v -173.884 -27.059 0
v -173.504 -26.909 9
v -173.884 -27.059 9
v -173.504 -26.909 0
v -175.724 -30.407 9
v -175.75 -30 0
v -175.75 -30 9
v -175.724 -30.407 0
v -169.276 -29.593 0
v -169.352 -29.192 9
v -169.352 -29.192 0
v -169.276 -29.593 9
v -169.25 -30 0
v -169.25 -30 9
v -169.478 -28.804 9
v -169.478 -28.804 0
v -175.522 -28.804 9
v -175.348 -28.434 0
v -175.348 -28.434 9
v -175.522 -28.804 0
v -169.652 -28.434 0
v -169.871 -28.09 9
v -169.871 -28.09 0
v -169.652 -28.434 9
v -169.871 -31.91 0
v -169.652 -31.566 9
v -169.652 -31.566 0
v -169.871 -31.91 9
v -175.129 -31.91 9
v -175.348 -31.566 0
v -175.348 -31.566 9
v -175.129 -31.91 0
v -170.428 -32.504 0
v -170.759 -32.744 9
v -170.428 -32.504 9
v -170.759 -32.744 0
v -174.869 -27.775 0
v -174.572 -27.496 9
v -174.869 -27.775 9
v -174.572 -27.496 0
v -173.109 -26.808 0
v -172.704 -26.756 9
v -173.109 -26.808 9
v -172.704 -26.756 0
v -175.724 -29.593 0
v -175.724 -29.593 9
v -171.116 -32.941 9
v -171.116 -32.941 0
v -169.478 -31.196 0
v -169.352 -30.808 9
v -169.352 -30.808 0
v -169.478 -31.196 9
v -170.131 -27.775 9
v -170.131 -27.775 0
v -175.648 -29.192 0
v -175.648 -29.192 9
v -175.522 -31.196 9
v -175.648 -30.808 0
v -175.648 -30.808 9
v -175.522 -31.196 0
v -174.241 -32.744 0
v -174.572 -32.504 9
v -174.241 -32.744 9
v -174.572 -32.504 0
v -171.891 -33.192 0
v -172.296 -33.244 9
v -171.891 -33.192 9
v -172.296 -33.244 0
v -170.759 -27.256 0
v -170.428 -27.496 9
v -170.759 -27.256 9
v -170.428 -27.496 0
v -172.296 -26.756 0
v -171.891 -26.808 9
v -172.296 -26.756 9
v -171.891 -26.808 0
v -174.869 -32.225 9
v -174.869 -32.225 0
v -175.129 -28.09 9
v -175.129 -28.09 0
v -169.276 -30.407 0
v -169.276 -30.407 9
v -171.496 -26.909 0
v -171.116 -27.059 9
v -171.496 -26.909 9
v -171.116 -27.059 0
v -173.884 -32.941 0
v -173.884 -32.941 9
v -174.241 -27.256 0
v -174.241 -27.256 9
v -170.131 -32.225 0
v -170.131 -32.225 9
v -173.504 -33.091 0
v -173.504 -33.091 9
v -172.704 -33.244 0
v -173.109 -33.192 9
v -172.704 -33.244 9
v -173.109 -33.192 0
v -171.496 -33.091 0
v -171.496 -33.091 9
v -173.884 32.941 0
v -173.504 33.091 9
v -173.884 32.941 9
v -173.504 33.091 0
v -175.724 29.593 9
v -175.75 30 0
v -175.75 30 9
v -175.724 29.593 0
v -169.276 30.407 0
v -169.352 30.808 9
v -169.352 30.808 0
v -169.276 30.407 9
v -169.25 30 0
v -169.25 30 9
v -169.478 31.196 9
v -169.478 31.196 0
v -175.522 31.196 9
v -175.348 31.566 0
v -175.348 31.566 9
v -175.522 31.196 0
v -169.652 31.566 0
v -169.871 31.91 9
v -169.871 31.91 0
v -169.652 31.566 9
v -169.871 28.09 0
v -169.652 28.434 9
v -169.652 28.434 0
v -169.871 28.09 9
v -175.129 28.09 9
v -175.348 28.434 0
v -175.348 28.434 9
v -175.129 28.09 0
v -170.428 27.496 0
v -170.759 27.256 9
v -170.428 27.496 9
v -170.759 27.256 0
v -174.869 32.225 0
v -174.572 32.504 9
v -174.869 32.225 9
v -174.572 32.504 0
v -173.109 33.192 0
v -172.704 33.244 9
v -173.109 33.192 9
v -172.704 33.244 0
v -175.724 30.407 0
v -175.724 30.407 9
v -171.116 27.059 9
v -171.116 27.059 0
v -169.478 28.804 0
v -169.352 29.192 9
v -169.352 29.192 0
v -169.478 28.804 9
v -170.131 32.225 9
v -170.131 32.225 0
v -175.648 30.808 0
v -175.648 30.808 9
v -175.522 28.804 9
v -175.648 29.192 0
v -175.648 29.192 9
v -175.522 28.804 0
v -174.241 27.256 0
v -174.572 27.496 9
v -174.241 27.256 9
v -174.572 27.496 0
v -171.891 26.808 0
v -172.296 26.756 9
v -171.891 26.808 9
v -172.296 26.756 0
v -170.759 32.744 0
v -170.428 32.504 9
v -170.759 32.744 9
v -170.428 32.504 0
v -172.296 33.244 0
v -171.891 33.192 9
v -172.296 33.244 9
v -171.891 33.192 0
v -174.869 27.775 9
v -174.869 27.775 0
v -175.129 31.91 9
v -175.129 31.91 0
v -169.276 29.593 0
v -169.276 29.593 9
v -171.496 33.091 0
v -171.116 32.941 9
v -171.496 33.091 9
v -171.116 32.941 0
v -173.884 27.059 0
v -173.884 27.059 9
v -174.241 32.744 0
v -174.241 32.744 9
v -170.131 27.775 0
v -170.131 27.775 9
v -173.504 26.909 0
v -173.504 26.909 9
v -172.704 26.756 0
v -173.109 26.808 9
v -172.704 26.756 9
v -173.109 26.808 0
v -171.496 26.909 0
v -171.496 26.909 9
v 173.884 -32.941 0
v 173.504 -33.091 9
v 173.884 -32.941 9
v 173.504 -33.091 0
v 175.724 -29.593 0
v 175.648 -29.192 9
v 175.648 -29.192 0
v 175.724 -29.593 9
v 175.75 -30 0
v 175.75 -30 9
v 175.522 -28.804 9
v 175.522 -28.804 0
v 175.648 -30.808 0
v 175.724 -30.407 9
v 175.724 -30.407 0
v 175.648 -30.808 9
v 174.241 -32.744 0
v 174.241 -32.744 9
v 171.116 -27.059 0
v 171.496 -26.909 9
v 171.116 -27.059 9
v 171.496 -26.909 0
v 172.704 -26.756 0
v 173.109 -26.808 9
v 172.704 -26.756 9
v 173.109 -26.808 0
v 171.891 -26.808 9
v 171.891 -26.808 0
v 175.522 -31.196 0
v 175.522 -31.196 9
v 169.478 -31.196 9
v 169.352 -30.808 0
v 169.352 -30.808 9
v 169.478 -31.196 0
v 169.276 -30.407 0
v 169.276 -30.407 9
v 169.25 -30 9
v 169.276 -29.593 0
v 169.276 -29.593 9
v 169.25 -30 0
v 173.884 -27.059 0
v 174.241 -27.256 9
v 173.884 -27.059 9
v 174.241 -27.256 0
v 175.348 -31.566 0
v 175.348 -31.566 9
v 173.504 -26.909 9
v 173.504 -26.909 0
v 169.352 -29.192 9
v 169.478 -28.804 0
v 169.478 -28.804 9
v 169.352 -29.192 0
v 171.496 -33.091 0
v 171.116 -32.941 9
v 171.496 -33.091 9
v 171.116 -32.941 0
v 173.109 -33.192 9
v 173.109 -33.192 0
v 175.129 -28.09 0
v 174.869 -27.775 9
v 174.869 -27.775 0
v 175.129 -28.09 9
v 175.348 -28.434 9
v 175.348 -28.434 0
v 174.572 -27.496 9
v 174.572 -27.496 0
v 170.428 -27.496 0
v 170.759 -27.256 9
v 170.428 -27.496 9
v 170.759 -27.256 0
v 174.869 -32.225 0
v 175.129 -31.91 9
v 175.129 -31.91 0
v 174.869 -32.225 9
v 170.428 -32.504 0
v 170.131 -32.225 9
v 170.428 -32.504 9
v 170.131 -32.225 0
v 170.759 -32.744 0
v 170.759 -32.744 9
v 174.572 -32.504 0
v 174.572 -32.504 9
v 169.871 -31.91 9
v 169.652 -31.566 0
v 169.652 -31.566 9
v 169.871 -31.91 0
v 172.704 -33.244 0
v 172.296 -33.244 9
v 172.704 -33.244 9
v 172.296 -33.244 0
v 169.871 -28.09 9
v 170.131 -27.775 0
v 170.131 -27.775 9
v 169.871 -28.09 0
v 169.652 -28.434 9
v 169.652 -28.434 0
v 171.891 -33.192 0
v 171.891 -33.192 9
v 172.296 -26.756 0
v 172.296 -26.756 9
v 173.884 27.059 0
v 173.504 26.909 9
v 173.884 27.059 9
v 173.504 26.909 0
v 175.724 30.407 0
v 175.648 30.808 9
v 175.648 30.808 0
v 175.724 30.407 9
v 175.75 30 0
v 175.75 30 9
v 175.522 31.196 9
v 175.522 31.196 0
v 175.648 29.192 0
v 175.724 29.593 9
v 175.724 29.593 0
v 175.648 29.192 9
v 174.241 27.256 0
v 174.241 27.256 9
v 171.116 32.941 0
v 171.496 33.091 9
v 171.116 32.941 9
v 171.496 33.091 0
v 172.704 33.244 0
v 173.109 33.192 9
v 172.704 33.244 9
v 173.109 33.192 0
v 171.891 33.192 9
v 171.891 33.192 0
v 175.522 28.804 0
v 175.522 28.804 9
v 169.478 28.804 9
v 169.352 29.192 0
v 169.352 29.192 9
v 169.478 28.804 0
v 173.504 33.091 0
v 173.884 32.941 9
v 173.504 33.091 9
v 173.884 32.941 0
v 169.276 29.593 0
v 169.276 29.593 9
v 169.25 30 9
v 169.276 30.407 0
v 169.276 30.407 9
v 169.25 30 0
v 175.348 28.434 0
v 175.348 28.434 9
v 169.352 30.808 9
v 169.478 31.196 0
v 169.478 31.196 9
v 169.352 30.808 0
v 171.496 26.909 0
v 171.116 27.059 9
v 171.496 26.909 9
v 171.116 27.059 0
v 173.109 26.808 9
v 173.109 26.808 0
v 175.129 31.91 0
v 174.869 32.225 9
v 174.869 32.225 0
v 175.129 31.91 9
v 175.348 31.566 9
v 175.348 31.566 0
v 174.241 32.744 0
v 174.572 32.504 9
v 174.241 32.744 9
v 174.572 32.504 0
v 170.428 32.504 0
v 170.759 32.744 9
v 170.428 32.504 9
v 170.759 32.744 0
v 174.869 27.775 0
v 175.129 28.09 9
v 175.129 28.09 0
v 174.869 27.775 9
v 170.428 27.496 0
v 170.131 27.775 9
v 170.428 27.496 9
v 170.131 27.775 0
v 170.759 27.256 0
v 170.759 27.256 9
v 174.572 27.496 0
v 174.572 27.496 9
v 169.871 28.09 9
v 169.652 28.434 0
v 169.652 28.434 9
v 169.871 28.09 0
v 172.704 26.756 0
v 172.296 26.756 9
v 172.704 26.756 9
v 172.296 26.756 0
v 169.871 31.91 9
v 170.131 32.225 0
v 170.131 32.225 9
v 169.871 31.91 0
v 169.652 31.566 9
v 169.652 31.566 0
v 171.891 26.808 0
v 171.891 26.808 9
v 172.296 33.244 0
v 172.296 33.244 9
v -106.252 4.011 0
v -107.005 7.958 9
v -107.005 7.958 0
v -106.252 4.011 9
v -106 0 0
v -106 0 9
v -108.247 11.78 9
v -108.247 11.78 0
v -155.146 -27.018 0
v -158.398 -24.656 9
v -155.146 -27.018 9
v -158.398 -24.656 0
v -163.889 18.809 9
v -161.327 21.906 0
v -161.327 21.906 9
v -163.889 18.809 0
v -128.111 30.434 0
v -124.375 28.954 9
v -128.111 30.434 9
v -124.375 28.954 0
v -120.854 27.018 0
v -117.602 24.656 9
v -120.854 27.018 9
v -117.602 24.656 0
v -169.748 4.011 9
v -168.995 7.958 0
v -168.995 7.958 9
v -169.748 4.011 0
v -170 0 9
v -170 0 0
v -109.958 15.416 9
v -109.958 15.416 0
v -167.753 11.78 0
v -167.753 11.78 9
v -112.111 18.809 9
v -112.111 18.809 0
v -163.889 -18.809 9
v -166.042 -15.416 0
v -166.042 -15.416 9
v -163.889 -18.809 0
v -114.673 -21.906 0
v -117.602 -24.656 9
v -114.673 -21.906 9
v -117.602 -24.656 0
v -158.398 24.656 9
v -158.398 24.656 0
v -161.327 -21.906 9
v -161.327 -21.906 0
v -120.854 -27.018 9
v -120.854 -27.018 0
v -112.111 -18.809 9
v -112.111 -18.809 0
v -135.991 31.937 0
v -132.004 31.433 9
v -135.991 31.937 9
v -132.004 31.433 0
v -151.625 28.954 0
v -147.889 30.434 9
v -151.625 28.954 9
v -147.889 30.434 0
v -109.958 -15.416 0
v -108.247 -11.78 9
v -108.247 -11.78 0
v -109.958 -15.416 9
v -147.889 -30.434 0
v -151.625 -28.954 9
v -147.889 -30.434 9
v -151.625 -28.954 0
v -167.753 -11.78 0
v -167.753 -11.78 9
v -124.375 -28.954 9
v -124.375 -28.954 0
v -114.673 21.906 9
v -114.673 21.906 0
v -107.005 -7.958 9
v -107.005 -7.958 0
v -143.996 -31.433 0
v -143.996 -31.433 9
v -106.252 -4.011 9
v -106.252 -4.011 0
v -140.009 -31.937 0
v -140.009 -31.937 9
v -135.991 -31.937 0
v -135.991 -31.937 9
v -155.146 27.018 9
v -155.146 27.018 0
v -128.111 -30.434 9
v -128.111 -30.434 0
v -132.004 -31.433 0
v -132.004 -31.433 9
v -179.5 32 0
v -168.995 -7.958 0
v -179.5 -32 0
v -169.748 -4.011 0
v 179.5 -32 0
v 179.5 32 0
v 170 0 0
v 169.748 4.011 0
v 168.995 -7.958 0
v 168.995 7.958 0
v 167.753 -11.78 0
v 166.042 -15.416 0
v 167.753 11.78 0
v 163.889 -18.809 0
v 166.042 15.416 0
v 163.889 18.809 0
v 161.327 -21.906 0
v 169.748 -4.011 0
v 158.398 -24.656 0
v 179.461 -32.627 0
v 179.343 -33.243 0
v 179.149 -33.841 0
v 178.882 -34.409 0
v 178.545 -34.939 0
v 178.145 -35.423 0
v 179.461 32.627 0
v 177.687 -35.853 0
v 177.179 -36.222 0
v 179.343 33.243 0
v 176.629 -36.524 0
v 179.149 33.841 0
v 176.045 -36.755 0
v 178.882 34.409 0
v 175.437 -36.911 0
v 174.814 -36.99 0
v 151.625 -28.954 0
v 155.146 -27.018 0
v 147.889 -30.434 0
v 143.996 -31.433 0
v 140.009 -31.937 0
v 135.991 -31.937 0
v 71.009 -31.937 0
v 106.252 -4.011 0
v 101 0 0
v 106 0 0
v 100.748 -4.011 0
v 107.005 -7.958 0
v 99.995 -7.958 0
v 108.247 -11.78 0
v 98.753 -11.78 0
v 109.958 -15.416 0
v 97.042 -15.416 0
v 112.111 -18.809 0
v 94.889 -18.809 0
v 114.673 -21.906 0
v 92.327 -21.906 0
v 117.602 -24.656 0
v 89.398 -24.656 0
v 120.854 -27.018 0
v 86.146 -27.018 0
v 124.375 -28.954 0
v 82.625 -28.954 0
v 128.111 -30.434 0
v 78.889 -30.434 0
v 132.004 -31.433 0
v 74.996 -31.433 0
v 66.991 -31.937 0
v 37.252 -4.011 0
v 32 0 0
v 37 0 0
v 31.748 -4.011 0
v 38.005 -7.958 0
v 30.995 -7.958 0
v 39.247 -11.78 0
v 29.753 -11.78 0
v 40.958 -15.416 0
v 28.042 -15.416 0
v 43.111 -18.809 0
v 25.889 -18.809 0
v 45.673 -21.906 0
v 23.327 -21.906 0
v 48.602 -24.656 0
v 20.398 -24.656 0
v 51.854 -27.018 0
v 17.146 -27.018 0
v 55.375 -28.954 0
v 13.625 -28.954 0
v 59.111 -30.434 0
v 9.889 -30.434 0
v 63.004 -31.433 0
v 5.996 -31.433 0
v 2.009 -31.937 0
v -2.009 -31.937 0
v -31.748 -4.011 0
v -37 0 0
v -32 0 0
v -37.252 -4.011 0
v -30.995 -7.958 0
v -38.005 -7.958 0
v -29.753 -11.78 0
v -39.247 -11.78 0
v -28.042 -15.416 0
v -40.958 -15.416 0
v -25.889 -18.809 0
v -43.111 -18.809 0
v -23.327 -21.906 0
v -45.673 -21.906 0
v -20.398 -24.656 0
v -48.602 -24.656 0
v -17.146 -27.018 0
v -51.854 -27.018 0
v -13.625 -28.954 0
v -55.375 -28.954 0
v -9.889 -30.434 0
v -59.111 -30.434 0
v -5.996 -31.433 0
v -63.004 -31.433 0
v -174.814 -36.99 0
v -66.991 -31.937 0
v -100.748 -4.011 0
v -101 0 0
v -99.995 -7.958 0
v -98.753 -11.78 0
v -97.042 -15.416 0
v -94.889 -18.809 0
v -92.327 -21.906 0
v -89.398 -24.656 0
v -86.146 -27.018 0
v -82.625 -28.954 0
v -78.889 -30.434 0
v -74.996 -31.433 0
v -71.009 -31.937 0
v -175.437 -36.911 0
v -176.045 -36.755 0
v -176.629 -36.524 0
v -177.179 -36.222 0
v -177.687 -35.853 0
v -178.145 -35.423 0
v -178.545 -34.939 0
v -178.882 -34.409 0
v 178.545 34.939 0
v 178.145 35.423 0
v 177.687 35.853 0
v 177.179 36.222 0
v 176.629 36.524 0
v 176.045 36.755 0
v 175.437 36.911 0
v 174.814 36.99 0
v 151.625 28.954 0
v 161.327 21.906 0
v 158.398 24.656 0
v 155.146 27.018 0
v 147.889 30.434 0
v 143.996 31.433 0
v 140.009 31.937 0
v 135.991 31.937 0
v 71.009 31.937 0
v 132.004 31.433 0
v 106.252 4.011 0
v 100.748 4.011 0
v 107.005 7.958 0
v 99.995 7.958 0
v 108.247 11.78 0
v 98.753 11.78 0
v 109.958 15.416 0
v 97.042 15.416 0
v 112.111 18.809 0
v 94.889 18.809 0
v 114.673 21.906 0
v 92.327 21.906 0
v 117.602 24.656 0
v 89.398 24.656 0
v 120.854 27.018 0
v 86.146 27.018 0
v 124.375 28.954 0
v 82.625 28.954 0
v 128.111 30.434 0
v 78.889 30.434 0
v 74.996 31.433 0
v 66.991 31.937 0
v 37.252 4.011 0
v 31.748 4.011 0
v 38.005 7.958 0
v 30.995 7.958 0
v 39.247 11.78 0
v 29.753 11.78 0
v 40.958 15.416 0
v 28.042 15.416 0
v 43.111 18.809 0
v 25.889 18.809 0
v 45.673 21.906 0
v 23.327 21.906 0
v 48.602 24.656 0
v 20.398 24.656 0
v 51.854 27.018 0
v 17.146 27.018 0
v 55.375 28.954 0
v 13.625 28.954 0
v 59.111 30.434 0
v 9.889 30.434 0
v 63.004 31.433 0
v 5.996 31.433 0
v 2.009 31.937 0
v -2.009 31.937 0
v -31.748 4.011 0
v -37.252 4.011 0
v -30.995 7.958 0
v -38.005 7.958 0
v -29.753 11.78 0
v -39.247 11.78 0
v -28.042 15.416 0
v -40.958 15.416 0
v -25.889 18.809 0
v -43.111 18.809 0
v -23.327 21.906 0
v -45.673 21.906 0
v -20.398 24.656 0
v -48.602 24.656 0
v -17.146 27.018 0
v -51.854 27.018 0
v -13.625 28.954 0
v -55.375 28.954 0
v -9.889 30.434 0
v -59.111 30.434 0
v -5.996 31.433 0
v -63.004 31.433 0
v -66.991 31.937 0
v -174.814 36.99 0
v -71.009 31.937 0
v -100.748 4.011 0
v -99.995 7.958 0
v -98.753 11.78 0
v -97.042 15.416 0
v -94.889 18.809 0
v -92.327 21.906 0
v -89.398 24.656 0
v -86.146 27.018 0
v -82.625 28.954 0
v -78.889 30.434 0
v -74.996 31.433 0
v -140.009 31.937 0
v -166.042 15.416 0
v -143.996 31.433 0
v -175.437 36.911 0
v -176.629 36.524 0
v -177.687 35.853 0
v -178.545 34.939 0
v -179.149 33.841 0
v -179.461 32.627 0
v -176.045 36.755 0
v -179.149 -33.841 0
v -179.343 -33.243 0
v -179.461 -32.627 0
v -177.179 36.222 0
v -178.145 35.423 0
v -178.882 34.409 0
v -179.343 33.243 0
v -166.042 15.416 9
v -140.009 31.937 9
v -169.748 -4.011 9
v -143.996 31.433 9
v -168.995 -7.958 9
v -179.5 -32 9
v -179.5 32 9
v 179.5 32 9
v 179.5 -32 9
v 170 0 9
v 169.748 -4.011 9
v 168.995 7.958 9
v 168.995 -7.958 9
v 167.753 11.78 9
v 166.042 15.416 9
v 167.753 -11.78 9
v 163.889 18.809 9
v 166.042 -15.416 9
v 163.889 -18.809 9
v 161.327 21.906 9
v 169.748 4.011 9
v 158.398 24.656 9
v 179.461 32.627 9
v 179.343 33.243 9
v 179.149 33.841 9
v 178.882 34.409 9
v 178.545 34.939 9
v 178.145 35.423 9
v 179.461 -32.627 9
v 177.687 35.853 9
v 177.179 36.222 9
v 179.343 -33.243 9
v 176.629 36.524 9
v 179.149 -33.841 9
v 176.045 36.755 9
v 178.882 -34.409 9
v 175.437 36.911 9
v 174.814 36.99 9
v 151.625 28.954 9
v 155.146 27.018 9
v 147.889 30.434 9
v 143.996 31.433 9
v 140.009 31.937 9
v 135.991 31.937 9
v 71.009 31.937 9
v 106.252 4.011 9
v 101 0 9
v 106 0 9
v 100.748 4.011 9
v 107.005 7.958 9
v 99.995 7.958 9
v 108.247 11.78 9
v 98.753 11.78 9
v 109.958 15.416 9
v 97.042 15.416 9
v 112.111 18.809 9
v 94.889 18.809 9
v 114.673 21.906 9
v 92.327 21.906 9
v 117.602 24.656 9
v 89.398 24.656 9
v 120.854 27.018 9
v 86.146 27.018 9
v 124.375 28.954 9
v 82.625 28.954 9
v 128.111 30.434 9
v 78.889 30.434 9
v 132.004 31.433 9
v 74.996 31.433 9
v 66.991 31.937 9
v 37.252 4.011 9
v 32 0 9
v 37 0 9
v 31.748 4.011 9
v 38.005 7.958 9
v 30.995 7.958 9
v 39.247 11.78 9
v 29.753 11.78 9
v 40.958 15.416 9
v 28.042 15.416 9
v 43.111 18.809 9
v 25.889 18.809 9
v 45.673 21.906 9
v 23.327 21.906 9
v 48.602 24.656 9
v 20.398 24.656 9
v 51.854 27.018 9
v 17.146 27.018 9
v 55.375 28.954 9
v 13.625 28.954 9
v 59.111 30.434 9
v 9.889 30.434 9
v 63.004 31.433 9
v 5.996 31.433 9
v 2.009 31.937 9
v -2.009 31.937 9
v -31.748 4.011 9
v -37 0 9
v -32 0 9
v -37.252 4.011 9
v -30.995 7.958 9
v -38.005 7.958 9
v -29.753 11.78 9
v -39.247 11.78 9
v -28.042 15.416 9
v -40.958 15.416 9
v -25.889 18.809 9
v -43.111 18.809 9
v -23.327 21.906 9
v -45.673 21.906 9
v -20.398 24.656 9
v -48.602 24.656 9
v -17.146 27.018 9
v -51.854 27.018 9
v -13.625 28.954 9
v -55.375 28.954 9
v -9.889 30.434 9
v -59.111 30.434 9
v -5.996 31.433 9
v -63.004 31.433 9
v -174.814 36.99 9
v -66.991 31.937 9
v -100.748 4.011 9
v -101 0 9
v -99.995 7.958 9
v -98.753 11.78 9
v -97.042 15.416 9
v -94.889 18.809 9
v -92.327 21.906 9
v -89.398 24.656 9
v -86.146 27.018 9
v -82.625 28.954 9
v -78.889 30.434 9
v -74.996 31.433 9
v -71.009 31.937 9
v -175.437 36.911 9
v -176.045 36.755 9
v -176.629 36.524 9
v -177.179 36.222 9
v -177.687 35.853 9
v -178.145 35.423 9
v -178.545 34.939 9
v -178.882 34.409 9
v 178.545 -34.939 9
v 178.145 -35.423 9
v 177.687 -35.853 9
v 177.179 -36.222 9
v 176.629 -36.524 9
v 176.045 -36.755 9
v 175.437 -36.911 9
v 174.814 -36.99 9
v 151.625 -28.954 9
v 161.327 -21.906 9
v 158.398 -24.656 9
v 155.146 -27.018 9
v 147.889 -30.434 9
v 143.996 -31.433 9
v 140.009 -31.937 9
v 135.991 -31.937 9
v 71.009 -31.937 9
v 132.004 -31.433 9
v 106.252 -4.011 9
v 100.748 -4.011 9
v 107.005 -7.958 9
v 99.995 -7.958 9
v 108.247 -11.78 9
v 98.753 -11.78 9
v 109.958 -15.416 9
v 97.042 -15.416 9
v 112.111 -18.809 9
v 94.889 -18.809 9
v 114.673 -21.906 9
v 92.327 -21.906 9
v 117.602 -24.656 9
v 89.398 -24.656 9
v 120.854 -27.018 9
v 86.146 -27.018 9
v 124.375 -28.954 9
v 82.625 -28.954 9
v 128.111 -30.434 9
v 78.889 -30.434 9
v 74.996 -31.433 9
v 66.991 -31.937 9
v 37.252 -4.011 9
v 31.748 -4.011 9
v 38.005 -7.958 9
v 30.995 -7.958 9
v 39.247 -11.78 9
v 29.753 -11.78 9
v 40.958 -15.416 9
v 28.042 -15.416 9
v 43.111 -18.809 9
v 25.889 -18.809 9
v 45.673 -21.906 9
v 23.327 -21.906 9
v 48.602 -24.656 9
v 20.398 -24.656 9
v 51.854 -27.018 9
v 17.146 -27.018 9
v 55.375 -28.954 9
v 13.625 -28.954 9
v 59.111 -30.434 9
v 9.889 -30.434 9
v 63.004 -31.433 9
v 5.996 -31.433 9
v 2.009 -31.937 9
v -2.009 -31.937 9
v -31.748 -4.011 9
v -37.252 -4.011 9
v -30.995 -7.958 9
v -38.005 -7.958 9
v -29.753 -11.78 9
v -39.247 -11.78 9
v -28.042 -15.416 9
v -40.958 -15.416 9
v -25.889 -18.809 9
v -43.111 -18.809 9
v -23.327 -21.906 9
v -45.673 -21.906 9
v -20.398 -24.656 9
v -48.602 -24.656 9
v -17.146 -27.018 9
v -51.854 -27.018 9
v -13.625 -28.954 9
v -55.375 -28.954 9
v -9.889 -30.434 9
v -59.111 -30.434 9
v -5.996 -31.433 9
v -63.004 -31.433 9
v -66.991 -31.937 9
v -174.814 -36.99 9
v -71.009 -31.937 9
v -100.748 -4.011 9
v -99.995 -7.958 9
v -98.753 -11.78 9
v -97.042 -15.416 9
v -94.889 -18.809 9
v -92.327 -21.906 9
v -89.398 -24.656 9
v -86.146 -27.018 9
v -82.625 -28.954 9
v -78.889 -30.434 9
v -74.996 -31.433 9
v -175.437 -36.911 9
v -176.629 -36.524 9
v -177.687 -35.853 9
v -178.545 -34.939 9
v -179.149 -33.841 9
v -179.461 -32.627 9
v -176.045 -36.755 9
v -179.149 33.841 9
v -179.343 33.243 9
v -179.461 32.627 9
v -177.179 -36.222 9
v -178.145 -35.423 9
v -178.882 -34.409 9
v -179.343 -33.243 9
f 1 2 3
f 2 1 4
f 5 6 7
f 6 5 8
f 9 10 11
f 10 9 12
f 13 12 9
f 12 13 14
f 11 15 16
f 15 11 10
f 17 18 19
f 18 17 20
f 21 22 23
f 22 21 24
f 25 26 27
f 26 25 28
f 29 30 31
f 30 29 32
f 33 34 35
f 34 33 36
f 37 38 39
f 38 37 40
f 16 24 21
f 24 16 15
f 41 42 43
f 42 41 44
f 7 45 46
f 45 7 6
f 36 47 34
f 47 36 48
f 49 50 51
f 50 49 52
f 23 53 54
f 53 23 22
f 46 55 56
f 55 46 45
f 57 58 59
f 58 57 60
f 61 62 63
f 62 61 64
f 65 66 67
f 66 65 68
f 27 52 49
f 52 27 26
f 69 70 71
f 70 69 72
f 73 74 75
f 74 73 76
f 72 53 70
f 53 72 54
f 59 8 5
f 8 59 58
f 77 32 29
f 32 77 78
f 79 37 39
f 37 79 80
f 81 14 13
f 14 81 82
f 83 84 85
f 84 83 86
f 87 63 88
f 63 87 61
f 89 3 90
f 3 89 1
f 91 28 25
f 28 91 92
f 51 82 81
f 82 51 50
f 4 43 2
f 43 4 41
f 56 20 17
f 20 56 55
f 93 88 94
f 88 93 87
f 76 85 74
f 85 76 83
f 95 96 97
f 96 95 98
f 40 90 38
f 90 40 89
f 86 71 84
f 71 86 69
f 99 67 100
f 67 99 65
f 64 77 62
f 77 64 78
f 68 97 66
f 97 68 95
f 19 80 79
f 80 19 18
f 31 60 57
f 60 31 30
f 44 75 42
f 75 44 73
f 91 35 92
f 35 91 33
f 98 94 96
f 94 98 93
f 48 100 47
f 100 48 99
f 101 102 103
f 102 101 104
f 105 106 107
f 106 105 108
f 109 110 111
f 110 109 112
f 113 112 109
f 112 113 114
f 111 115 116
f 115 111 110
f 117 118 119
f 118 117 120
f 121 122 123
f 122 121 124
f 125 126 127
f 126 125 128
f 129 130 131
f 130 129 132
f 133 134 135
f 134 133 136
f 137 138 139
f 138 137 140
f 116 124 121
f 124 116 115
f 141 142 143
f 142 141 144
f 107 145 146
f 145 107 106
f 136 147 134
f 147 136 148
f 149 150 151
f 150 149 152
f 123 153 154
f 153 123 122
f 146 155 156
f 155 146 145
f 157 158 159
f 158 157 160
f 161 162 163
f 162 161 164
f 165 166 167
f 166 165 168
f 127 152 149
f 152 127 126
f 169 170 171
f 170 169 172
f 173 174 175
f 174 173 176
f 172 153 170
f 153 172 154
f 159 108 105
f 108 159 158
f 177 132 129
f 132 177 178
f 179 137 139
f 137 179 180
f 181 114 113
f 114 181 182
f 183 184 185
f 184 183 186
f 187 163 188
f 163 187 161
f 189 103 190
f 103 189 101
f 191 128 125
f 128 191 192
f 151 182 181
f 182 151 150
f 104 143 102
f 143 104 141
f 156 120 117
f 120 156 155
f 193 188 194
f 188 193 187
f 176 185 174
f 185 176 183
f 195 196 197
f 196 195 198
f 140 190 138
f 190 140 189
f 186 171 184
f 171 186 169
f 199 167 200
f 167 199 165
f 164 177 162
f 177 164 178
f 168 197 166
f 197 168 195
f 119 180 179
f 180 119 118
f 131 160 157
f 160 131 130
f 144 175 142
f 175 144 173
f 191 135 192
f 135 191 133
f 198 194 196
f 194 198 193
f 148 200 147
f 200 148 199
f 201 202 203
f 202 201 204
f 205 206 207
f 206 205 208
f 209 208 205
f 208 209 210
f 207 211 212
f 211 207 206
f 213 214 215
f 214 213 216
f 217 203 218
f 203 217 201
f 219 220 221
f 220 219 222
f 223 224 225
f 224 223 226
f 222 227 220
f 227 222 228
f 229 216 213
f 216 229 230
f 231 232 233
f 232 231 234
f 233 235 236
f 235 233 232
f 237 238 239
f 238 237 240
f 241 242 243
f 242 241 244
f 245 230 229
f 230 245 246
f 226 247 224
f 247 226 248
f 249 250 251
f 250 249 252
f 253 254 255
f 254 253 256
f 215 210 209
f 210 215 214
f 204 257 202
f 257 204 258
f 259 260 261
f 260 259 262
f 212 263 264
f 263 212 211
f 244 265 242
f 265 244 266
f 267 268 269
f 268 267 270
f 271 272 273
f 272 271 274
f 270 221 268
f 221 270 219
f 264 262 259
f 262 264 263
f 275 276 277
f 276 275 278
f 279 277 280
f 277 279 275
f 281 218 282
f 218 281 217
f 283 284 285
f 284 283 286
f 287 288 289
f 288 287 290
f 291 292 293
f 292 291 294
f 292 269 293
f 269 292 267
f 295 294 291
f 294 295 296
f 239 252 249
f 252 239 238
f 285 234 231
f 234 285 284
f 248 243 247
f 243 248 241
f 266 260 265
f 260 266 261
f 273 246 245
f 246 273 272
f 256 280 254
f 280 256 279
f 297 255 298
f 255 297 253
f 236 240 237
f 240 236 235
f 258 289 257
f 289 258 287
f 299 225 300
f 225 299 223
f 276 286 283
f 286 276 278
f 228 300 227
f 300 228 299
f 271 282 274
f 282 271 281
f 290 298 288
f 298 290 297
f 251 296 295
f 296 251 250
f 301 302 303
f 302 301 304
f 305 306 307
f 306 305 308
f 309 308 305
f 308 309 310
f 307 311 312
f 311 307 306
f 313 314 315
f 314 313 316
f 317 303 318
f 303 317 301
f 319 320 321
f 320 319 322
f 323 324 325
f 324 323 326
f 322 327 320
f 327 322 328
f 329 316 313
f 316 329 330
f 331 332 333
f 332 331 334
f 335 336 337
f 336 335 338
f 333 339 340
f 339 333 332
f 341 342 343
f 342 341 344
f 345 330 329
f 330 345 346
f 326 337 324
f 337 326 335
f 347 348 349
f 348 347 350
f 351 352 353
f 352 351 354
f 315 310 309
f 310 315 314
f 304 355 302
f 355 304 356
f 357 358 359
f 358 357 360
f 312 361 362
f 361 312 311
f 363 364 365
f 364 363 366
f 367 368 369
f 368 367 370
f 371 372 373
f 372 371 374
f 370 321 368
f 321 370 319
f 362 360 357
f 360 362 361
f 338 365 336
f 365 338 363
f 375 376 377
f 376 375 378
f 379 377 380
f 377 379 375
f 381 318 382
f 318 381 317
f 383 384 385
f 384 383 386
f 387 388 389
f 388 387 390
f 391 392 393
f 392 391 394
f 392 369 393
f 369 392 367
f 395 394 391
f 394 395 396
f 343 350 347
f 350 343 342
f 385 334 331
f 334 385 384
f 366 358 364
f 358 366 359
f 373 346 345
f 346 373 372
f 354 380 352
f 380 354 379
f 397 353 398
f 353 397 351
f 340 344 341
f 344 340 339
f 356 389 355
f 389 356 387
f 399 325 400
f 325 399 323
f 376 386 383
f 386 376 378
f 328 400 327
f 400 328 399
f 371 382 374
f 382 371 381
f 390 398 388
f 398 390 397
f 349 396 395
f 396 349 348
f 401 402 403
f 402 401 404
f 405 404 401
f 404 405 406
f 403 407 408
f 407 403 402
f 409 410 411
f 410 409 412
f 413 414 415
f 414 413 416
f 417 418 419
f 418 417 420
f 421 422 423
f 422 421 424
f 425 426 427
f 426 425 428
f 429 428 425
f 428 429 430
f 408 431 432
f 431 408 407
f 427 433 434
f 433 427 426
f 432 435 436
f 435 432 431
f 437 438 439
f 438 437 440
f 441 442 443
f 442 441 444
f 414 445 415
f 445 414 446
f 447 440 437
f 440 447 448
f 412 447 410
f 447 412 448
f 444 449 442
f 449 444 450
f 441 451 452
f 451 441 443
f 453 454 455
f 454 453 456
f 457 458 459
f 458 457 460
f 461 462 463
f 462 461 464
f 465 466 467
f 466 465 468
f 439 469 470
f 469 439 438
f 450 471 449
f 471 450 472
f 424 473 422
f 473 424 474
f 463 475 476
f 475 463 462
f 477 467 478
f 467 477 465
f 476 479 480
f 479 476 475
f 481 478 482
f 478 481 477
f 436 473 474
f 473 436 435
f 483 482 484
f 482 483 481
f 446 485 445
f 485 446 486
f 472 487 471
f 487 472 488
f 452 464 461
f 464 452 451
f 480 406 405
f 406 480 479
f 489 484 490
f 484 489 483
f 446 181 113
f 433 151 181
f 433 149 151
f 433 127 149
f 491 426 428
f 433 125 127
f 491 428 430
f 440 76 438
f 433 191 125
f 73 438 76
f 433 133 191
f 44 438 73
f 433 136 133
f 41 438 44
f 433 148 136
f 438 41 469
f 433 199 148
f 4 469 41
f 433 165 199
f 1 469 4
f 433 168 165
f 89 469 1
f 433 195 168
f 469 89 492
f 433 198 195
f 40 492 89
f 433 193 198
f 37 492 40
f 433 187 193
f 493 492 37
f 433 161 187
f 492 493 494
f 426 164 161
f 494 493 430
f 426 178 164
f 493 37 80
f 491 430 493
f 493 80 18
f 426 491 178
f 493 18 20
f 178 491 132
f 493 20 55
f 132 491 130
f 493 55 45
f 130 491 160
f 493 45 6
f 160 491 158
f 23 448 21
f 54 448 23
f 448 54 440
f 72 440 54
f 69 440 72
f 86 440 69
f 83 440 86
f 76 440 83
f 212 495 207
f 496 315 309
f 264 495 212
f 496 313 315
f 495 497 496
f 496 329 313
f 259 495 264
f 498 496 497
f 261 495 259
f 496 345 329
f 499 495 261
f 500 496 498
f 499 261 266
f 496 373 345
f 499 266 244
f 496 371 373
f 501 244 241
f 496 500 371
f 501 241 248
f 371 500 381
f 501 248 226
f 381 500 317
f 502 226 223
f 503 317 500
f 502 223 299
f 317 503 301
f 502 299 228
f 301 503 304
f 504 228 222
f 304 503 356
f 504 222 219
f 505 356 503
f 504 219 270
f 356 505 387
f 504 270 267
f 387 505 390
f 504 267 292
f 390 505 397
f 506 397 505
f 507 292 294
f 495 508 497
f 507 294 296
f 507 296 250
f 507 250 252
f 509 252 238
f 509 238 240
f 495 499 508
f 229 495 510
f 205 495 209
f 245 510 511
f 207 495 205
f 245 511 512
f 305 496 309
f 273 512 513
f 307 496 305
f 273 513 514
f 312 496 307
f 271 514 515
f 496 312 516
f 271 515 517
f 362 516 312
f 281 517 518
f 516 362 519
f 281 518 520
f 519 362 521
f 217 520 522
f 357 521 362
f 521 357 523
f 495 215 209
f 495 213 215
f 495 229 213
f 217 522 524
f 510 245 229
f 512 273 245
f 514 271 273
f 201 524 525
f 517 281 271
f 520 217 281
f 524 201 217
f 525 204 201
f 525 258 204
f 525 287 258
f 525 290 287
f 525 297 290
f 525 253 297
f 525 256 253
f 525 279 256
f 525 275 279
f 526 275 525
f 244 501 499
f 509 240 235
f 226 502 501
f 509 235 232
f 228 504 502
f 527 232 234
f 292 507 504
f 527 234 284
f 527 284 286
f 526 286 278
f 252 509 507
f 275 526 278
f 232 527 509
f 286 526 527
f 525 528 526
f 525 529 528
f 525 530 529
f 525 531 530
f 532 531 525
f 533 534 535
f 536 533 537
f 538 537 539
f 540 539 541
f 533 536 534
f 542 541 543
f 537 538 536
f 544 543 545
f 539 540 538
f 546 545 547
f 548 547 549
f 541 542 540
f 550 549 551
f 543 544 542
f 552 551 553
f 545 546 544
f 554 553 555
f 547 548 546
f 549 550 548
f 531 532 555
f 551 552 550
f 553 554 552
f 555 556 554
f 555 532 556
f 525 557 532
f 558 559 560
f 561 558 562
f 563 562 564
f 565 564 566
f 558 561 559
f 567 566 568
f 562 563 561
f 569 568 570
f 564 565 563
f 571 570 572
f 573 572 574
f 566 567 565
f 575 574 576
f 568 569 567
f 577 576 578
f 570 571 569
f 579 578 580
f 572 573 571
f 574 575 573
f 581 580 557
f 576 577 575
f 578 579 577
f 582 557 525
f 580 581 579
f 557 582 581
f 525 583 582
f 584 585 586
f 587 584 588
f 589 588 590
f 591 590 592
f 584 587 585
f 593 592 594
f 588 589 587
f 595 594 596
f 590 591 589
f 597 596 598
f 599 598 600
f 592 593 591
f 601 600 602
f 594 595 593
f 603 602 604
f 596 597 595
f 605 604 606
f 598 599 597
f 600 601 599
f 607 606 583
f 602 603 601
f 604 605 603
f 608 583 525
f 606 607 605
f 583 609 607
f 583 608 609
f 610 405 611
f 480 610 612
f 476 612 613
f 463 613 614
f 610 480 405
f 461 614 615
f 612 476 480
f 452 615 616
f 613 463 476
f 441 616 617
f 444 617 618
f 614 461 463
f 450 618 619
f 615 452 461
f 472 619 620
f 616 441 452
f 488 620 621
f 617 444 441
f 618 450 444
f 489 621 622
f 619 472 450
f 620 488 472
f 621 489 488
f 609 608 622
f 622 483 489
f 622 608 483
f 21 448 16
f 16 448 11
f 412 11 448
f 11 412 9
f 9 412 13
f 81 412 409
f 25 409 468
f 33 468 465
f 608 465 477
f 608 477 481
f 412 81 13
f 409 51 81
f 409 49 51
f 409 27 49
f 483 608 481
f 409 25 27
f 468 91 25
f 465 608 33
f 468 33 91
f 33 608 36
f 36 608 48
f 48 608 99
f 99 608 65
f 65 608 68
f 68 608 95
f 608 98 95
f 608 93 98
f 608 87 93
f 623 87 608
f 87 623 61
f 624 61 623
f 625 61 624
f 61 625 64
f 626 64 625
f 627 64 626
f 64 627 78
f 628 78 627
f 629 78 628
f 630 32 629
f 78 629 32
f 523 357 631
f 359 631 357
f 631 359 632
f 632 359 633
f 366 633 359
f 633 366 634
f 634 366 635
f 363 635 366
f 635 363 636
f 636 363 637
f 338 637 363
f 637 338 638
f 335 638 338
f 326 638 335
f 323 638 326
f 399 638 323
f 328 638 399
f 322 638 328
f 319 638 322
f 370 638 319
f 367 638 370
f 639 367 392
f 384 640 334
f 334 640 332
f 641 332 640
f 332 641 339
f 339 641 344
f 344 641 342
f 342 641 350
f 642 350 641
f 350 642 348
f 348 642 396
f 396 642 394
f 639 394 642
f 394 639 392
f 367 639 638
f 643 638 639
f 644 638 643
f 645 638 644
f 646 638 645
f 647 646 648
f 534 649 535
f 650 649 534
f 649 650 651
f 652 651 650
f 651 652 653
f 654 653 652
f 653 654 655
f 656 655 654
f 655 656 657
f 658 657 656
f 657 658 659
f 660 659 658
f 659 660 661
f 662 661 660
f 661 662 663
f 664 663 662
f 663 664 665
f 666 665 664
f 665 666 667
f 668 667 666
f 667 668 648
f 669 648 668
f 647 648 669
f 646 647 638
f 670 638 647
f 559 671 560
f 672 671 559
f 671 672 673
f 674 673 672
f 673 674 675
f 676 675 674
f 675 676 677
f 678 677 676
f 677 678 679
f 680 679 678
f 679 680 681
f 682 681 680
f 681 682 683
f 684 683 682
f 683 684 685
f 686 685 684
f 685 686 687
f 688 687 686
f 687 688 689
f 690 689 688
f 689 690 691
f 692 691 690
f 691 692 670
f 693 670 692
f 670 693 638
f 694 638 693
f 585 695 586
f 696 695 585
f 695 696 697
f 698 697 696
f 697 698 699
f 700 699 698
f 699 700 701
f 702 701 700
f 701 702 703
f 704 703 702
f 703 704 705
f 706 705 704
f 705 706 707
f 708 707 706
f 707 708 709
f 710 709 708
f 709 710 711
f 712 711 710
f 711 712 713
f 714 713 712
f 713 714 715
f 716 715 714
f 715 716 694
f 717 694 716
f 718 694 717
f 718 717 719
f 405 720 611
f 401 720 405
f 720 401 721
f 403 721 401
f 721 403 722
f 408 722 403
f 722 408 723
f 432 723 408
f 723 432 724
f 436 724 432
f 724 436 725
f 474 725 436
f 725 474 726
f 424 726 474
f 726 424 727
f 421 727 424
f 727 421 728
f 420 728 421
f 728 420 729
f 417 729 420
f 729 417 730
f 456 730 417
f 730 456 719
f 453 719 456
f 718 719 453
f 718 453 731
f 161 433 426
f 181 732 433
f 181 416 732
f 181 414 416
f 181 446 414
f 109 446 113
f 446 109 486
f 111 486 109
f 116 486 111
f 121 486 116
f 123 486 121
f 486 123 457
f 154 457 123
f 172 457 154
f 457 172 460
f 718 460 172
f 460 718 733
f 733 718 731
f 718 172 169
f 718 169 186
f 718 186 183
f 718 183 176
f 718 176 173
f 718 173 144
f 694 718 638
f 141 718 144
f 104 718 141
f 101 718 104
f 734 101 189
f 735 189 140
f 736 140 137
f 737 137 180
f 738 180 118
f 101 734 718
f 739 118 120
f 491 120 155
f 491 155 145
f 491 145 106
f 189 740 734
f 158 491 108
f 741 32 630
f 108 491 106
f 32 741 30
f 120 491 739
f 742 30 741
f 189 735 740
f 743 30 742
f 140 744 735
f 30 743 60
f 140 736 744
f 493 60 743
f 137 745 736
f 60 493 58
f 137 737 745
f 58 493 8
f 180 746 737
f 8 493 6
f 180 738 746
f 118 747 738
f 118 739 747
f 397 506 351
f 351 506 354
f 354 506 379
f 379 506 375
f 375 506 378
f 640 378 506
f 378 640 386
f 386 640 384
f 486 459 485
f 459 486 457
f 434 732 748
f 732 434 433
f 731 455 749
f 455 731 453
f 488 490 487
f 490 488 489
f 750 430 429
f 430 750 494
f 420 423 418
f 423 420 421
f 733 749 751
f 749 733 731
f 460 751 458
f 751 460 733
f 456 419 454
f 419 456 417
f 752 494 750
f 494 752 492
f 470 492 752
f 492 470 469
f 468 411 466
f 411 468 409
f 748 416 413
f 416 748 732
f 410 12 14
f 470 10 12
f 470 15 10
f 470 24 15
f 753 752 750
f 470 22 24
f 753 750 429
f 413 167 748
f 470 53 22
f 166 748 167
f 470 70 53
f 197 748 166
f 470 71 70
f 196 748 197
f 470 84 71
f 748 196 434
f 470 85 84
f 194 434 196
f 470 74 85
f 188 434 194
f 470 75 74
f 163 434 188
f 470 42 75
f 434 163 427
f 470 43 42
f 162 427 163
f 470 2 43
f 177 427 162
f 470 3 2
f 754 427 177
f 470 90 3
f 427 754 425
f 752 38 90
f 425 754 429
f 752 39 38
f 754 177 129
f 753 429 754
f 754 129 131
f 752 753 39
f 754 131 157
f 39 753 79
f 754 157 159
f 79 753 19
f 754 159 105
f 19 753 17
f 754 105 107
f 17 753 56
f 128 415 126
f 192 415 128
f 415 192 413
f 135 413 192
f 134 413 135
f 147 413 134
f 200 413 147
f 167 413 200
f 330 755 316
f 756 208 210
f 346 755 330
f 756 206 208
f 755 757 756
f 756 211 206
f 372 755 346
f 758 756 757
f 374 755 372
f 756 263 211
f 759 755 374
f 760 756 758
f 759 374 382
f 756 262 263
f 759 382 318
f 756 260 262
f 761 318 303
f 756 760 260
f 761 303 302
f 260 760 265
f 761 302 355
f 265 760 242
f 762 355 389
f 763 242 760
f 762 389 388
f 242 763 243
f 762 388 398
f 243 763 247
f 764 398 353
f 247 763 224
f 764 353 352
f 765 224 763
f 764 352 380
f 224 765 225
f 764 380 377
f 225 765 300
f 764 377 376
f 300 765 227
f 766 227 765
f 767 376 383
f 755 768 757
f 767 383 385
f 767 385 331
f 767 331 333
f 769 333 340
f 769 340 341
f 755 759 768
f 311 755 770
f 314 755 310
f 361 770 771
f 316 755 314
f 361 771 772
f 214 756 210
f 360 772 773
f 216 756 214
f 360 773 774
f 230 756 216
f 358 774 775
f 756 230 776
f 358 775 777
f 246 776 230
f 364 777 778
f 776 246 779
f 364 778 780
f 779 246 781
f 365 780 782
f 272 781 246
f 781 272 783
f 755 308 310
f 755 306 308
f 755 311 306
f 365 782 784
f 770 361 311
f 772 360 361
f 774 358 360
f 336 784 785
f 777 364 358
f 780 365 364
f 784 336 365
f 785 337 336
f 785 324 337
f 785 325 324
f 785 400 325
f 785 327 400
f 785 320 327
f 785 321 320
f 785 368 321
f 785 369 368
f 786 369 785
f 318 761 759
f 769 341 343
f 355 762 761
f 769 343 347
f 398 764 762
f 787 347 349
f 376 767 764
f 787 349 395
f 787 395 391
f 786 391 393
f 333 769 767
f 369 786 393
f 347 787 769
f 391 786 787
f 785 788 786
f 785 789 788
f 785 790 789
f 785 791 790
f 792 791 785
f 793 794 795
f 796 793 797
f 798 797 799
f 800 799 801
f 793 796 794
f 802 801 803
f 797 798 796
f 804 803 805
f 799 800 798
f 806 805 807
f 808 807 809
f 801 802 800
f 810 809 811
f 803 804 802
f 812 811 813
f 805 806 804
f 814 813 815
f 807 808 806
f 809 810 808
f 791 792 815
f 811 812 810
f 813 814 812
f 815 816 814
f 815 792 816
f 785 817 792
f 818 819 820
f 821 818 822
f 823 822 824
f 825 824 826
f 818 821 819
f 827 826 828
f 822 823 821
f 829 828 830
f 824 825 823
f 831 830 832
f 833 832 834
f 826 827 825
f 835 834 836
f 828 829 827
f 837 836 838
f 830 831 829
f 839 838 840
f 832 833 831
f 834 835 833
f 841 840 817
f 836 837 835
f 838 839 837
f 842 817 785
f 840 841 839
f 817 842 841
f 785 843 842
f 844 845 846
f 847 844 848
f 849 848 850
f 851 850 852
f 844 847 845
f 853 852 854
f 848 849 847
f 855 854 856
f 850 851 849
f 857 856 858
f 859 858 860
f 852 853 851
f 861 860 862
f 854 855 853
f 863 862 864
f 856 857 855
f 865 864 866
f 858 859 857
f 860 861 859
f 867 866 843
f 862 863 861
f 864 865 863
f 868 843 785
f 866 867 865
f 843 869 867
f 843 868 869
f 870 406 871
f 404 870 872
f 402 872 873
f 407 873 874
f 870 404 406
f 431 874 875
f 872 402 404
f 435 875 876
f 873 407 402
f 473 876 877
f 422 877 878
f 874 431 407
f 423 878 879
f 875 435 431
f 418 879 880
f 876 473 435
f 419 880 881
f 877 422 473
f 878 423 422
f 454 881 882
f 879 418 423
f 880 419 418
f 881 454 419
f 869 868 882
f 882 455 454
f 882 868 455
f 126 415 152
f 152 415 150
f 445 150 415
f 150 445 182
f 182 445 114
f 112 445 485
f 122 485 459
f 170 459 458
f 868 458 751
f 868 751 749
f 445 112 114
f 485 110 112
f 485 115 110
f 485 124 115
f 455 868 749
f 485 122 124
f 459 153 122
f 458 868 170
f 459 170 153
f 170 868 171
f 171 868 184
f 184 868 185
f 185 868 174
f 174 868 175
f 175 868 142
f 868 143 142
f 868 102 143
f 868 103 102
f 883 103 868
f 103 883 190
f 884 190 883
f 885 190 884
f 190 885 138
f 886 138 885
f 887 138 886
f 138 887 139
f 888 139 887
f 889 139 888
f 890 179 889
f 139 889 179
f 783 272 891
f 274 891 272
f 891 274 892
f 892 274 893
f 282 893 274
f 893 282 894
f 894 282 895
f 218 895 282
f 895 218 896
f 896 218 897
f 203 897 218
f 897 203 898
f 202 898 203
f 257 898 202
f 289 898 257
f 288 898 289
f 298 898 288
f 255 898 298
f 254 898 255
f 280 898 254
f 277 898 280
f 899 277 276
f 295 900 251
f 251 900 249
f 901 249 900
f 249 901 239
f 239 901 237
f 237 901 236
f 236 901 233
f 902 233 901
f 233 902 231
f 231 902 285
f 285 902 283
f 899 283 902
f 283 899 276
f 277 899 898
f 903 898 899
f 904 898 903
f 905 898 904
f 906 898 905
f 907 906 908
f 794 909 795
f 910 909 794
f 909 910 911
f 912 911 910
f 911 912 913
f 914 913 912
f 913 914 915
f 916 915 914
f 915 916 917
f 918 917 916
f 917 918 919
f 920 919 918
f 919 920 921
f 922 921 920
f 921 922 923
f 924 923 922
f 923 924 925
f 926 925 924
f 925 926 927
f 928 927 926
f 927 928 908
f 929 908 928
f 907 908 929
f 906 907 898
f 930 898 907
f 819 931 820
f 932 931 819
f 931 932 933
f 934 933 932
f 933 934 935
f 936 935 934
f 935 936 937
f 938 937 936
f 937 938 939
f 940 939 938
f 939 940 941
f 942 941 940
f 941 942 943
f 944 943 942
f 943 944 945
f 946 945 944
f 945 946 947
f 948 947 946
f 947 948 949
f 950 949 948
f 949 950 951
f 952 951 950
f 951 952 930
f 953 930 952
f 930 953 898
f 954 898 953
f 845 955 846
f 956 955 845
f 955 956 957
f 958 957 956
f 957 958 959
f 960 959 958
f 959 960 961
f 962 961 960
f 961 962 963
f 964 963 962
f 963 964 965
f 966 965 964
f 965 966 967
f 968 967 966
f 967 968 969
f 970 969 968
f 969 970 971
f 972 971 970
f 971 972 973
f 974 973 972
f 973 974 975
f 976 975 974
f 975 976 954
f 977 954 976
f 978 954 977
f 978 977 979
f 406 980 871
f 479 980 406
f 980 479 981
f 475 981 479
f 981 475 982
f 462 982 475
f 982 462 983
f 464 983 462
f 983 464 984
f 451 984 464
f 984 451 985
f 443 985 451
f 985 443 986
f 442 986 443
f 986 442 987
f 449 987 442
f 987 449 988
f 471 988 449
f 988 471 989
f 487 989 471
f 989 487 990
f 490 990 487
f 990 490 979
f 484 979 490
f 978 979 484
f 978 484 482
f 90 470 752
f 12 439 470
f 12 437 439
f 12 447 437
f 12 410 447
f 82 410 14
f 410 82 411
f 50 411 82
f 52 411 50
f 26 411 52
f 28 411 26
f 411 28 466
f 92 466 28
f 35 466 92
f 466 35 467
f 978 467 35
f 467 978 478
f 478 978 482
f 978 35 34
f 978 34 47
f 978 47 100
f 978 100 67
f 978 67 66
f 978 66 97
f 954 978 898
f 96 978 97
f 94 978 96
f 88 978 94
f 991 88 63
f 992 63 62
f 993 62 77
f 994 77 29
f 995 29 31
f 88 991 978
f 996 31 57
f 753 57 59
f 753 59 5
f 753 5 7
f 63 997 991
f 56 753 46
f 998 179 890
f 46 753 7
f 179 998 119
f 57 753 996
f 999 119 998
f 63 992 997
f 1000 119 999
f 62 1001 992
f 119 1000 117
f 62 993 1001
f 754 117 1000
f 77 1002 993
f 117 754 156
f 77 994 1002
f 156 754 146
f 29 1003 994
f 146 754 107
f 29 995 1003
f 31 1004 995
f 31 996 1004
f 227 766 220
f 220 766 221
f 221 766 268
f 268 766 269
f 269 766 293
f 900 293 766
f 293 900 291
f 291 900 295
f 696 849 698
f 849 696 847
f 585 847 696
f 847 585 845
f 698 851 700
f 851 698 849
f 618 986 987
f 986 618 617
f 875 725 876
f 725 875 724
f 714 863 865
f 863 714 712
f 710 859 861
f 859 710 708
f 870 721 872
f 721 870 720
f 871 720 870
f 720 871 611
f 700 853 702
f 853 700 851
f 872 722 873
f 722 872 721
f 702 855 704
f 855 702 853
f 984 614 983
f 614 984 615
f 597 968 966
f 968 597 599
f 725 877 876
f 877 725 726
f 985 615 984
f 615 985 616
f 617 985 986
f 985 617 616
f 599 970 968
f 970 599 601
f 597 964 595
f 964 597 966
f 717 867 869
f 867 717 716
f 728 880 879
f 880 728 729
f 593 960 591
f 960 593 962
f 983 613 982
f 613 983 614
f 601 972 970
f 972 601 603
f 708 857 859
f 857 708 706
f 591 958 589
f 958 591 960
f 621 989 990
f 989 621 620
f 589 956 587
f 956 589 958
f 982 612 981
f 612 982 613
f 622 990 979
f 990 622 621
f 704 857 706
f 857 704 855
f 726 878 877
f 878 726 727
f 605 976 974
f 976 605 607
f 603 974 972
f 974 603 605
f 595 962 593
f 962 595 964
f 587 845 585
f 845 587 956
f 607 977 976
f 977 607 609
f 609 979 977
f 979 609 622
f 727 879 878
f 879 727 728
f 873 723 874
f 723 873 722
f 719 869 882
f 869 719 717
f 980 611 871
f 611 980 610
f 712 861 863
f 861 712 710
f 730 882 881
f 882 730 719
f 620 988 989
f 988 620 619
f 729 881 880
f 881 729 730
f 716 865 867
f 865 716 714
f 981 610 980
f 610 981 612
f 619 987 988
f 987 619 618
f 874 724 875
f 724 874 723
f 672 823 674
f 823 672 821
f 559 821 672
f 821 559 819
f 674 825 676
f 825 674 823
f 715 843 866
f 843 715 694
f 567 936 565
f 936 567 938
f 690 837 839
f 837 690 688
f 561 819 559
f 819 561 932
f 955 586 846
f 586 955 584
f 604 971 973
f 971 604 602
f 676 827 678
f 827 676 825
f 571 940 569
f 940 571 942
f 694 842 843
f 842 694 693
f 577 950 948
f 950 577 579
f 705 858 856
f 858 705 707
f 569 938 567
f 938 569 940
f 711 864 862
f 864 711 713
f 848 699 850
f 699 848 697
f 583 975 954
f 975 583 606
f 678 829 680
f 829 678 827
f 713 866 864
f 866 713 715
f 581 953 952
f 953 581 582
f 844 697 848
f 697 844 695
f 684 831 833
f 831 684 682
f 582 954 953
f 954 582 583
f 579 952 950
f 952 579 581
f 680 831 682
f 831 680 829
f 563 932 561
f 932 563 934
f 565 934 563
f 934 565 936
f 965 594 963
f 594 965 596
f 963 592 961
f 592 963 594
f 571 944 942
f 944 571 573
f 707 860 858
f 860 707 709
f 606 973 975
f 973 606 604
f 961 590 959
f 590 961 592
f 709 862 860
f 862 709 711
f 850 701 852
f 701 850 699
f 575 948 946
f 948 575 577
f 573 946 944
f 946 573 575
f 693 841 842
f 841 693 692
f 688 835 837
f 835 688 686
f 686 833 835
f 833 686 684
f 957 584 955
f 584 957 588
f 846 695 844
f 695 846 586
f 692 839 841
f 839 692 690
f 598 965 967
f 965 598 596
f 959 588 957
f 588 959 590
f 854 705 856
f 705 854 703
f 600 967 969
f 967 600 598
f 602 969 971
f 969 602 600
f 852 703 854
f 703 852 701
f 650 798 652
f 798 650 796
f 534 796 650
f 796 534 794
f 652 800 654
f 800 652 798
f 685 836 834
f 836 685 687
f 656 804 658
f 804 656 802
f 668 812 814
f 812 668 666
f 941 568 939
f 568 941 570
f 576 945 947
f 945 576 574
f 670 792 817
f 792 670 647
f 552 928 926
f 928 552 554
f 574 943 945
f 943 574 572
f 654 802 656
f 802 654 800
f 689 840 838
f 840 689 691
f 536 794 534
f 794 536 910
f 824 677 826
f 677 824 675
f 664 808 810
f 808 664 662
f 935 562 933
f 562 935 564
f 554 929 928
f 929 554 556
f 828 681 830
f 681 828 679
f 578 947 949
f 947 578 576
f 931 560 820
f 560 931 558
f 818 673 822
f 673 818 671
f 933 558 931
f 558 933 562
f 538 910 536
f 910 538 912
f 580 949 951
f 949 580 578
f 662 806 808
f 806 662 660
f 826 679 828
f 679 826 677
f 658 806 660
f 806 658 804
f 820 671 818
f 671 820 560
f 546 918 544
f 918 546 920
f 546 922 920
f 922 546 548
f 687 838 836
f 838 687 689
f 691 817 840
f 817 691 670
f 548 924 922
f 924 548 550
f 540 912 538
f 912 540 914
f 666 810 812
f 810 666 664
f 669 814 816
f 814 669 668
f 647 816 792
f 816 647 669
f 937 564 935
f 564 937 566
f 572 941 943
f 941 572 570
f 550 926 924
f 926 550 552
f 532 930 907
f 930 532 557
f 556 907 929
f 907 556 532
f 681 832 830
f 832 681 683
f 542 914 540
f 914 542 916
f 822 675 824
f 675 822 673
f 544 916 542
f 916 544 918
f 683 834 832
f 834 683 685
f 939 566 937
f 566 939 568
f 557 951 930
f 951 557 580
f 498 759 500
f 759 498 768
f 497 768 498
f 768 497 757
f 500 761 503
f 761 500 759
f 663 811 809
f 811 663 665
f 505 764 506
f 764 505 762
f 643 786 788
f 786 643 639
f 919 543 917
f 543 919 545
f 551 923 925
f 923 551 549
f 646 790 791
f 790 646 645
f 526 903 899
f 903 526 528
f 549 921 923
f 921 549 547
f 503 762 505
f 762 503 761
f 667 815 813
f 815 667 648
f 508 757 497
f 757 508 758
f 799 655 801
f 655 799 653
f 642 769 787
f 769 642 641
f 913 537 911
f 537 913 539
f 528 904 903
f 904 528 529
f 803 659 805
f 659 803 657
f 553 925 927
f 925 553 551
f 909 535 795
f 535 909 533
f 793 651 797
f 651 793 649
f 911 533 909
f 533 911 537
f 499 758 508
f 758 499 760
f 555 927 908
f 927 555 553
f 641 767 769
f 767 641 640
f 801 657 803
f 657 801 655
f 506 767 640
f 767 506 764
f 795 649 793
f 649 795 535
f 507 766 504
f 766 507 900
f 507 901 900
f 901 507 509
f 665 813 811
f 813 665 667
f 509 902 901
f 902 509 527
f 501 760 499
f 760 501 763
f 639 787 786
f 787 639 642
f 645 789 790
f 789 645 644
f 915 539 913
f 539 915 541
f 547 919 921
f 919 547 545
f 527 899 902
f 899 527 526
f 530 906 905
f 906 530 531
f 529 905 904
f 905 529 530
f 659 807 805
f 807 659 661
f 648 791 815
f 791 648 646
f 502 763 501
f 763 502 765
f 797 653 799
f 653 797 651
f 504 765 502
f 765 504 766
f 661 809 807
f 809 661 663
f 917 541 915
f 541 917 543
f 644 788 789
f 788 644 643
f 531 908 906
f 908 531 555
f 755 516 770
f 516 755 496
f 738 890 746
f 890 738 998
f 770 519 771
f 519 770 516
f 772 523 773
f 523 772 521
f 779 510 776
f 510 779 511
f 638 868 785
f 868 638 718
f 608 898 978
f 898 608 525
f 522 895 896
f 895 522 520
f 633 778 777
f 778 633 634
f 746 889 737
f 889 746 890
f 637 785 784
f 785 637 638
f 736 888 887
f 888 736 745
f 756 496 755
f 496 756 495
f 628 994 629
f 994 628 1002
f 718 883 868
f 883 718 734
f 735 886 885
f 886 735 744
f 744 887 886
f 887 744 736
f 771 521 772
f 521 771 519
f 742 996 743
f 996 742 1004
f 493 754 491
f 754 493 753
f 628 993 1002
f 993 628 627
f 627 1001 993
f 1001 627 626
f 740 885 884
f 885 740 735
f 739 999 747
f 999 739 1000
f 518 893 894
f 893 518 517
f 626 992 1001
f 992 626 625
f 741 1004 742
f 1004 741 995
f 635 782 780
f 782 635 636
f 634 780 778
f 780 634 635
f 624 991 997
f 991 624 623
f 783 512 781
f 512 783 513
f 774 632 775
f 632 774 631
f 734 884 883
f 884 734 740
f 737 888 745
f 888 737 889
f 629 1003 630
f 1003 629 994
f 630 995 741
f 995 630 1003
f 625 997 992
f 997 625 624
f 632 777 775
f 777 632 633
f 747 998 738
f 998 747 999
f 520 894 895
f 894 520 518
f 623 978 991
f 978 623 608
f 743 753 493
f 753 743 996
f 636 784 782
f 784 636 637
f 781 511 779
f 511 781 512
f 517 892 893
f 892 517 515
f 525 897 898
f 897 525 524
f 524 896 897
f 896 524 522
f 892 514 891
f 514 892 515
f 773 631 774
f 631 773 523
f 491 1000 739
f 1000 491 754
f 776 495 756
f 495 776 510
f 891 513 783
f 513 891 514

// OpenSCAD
$fn = 50;

difference() {
	union() {
		hull() {
			translate(v = [-174.5, 32.0, 0]) {
				cylinder(h = 9, r = 5);
			}
			translate(v = [174.5, 32.0, 0]) {
				cylinder(h = 9, r = 5);
			}
			translate(v = [-174.5, -32.0, 0]) {
				cylinder(h = 9, r = 5);
			}
			translate(v = [174.5, -32.0, 0]) {
				cylinder(h = 9, r = 5);
			}
		}
	}
	union() {
		translate(v = [-172.5, -30.0, -100.0]) {
			cylinder(h = 200, r = 3.25);
		}
		translate(v = [-172.5, 30.0, -100.0]) {
			cylinder(h = 200, r = 3.25);
		}
		translate(v = [172.5, -30.0, -100.0]) {
			cylinder(h = 200, r = 3.25);
		}
		translate(v = [172.5, 30.0, -100.0]) {
			cylinder(h = 200, r = 3.25);
		}
		translate(v = [-172.5, -30.0, -100.0]) {
			cylinder(h = 200, r = 1.8);
		}
		translate(v = [-172.5, 30.0, -100.0]) {
			cylinder(h = 200, r = 1.8);
		}
		translate(v = [172.5, -30.0, -100.0]) {
			cylinder(h = 200, r = 1.8);
		}
		translate(v = [172.5, 30.0, -100.0]) {
			cylinder(h = 200, r = 1.8);
		}
		translate(v = [-138.0, 0, 0.0]) {
			cylinder(h = 9, r = 32.0);
		}
		translate(v = [-69.0, 0, 0.0]) {
			cylinder(h = 9, r = 32.0);
		}
		cylinder(h = 9, r = 32.0);
		translate(v = [69.0, 0, 0.0]) {
			cylinder(h = 9, r = 32.0);
		}
		translate(v = [138.0, 0, 0.0]) {
			cylinder(h = 9, r = 32.0);
		}
	}
}
